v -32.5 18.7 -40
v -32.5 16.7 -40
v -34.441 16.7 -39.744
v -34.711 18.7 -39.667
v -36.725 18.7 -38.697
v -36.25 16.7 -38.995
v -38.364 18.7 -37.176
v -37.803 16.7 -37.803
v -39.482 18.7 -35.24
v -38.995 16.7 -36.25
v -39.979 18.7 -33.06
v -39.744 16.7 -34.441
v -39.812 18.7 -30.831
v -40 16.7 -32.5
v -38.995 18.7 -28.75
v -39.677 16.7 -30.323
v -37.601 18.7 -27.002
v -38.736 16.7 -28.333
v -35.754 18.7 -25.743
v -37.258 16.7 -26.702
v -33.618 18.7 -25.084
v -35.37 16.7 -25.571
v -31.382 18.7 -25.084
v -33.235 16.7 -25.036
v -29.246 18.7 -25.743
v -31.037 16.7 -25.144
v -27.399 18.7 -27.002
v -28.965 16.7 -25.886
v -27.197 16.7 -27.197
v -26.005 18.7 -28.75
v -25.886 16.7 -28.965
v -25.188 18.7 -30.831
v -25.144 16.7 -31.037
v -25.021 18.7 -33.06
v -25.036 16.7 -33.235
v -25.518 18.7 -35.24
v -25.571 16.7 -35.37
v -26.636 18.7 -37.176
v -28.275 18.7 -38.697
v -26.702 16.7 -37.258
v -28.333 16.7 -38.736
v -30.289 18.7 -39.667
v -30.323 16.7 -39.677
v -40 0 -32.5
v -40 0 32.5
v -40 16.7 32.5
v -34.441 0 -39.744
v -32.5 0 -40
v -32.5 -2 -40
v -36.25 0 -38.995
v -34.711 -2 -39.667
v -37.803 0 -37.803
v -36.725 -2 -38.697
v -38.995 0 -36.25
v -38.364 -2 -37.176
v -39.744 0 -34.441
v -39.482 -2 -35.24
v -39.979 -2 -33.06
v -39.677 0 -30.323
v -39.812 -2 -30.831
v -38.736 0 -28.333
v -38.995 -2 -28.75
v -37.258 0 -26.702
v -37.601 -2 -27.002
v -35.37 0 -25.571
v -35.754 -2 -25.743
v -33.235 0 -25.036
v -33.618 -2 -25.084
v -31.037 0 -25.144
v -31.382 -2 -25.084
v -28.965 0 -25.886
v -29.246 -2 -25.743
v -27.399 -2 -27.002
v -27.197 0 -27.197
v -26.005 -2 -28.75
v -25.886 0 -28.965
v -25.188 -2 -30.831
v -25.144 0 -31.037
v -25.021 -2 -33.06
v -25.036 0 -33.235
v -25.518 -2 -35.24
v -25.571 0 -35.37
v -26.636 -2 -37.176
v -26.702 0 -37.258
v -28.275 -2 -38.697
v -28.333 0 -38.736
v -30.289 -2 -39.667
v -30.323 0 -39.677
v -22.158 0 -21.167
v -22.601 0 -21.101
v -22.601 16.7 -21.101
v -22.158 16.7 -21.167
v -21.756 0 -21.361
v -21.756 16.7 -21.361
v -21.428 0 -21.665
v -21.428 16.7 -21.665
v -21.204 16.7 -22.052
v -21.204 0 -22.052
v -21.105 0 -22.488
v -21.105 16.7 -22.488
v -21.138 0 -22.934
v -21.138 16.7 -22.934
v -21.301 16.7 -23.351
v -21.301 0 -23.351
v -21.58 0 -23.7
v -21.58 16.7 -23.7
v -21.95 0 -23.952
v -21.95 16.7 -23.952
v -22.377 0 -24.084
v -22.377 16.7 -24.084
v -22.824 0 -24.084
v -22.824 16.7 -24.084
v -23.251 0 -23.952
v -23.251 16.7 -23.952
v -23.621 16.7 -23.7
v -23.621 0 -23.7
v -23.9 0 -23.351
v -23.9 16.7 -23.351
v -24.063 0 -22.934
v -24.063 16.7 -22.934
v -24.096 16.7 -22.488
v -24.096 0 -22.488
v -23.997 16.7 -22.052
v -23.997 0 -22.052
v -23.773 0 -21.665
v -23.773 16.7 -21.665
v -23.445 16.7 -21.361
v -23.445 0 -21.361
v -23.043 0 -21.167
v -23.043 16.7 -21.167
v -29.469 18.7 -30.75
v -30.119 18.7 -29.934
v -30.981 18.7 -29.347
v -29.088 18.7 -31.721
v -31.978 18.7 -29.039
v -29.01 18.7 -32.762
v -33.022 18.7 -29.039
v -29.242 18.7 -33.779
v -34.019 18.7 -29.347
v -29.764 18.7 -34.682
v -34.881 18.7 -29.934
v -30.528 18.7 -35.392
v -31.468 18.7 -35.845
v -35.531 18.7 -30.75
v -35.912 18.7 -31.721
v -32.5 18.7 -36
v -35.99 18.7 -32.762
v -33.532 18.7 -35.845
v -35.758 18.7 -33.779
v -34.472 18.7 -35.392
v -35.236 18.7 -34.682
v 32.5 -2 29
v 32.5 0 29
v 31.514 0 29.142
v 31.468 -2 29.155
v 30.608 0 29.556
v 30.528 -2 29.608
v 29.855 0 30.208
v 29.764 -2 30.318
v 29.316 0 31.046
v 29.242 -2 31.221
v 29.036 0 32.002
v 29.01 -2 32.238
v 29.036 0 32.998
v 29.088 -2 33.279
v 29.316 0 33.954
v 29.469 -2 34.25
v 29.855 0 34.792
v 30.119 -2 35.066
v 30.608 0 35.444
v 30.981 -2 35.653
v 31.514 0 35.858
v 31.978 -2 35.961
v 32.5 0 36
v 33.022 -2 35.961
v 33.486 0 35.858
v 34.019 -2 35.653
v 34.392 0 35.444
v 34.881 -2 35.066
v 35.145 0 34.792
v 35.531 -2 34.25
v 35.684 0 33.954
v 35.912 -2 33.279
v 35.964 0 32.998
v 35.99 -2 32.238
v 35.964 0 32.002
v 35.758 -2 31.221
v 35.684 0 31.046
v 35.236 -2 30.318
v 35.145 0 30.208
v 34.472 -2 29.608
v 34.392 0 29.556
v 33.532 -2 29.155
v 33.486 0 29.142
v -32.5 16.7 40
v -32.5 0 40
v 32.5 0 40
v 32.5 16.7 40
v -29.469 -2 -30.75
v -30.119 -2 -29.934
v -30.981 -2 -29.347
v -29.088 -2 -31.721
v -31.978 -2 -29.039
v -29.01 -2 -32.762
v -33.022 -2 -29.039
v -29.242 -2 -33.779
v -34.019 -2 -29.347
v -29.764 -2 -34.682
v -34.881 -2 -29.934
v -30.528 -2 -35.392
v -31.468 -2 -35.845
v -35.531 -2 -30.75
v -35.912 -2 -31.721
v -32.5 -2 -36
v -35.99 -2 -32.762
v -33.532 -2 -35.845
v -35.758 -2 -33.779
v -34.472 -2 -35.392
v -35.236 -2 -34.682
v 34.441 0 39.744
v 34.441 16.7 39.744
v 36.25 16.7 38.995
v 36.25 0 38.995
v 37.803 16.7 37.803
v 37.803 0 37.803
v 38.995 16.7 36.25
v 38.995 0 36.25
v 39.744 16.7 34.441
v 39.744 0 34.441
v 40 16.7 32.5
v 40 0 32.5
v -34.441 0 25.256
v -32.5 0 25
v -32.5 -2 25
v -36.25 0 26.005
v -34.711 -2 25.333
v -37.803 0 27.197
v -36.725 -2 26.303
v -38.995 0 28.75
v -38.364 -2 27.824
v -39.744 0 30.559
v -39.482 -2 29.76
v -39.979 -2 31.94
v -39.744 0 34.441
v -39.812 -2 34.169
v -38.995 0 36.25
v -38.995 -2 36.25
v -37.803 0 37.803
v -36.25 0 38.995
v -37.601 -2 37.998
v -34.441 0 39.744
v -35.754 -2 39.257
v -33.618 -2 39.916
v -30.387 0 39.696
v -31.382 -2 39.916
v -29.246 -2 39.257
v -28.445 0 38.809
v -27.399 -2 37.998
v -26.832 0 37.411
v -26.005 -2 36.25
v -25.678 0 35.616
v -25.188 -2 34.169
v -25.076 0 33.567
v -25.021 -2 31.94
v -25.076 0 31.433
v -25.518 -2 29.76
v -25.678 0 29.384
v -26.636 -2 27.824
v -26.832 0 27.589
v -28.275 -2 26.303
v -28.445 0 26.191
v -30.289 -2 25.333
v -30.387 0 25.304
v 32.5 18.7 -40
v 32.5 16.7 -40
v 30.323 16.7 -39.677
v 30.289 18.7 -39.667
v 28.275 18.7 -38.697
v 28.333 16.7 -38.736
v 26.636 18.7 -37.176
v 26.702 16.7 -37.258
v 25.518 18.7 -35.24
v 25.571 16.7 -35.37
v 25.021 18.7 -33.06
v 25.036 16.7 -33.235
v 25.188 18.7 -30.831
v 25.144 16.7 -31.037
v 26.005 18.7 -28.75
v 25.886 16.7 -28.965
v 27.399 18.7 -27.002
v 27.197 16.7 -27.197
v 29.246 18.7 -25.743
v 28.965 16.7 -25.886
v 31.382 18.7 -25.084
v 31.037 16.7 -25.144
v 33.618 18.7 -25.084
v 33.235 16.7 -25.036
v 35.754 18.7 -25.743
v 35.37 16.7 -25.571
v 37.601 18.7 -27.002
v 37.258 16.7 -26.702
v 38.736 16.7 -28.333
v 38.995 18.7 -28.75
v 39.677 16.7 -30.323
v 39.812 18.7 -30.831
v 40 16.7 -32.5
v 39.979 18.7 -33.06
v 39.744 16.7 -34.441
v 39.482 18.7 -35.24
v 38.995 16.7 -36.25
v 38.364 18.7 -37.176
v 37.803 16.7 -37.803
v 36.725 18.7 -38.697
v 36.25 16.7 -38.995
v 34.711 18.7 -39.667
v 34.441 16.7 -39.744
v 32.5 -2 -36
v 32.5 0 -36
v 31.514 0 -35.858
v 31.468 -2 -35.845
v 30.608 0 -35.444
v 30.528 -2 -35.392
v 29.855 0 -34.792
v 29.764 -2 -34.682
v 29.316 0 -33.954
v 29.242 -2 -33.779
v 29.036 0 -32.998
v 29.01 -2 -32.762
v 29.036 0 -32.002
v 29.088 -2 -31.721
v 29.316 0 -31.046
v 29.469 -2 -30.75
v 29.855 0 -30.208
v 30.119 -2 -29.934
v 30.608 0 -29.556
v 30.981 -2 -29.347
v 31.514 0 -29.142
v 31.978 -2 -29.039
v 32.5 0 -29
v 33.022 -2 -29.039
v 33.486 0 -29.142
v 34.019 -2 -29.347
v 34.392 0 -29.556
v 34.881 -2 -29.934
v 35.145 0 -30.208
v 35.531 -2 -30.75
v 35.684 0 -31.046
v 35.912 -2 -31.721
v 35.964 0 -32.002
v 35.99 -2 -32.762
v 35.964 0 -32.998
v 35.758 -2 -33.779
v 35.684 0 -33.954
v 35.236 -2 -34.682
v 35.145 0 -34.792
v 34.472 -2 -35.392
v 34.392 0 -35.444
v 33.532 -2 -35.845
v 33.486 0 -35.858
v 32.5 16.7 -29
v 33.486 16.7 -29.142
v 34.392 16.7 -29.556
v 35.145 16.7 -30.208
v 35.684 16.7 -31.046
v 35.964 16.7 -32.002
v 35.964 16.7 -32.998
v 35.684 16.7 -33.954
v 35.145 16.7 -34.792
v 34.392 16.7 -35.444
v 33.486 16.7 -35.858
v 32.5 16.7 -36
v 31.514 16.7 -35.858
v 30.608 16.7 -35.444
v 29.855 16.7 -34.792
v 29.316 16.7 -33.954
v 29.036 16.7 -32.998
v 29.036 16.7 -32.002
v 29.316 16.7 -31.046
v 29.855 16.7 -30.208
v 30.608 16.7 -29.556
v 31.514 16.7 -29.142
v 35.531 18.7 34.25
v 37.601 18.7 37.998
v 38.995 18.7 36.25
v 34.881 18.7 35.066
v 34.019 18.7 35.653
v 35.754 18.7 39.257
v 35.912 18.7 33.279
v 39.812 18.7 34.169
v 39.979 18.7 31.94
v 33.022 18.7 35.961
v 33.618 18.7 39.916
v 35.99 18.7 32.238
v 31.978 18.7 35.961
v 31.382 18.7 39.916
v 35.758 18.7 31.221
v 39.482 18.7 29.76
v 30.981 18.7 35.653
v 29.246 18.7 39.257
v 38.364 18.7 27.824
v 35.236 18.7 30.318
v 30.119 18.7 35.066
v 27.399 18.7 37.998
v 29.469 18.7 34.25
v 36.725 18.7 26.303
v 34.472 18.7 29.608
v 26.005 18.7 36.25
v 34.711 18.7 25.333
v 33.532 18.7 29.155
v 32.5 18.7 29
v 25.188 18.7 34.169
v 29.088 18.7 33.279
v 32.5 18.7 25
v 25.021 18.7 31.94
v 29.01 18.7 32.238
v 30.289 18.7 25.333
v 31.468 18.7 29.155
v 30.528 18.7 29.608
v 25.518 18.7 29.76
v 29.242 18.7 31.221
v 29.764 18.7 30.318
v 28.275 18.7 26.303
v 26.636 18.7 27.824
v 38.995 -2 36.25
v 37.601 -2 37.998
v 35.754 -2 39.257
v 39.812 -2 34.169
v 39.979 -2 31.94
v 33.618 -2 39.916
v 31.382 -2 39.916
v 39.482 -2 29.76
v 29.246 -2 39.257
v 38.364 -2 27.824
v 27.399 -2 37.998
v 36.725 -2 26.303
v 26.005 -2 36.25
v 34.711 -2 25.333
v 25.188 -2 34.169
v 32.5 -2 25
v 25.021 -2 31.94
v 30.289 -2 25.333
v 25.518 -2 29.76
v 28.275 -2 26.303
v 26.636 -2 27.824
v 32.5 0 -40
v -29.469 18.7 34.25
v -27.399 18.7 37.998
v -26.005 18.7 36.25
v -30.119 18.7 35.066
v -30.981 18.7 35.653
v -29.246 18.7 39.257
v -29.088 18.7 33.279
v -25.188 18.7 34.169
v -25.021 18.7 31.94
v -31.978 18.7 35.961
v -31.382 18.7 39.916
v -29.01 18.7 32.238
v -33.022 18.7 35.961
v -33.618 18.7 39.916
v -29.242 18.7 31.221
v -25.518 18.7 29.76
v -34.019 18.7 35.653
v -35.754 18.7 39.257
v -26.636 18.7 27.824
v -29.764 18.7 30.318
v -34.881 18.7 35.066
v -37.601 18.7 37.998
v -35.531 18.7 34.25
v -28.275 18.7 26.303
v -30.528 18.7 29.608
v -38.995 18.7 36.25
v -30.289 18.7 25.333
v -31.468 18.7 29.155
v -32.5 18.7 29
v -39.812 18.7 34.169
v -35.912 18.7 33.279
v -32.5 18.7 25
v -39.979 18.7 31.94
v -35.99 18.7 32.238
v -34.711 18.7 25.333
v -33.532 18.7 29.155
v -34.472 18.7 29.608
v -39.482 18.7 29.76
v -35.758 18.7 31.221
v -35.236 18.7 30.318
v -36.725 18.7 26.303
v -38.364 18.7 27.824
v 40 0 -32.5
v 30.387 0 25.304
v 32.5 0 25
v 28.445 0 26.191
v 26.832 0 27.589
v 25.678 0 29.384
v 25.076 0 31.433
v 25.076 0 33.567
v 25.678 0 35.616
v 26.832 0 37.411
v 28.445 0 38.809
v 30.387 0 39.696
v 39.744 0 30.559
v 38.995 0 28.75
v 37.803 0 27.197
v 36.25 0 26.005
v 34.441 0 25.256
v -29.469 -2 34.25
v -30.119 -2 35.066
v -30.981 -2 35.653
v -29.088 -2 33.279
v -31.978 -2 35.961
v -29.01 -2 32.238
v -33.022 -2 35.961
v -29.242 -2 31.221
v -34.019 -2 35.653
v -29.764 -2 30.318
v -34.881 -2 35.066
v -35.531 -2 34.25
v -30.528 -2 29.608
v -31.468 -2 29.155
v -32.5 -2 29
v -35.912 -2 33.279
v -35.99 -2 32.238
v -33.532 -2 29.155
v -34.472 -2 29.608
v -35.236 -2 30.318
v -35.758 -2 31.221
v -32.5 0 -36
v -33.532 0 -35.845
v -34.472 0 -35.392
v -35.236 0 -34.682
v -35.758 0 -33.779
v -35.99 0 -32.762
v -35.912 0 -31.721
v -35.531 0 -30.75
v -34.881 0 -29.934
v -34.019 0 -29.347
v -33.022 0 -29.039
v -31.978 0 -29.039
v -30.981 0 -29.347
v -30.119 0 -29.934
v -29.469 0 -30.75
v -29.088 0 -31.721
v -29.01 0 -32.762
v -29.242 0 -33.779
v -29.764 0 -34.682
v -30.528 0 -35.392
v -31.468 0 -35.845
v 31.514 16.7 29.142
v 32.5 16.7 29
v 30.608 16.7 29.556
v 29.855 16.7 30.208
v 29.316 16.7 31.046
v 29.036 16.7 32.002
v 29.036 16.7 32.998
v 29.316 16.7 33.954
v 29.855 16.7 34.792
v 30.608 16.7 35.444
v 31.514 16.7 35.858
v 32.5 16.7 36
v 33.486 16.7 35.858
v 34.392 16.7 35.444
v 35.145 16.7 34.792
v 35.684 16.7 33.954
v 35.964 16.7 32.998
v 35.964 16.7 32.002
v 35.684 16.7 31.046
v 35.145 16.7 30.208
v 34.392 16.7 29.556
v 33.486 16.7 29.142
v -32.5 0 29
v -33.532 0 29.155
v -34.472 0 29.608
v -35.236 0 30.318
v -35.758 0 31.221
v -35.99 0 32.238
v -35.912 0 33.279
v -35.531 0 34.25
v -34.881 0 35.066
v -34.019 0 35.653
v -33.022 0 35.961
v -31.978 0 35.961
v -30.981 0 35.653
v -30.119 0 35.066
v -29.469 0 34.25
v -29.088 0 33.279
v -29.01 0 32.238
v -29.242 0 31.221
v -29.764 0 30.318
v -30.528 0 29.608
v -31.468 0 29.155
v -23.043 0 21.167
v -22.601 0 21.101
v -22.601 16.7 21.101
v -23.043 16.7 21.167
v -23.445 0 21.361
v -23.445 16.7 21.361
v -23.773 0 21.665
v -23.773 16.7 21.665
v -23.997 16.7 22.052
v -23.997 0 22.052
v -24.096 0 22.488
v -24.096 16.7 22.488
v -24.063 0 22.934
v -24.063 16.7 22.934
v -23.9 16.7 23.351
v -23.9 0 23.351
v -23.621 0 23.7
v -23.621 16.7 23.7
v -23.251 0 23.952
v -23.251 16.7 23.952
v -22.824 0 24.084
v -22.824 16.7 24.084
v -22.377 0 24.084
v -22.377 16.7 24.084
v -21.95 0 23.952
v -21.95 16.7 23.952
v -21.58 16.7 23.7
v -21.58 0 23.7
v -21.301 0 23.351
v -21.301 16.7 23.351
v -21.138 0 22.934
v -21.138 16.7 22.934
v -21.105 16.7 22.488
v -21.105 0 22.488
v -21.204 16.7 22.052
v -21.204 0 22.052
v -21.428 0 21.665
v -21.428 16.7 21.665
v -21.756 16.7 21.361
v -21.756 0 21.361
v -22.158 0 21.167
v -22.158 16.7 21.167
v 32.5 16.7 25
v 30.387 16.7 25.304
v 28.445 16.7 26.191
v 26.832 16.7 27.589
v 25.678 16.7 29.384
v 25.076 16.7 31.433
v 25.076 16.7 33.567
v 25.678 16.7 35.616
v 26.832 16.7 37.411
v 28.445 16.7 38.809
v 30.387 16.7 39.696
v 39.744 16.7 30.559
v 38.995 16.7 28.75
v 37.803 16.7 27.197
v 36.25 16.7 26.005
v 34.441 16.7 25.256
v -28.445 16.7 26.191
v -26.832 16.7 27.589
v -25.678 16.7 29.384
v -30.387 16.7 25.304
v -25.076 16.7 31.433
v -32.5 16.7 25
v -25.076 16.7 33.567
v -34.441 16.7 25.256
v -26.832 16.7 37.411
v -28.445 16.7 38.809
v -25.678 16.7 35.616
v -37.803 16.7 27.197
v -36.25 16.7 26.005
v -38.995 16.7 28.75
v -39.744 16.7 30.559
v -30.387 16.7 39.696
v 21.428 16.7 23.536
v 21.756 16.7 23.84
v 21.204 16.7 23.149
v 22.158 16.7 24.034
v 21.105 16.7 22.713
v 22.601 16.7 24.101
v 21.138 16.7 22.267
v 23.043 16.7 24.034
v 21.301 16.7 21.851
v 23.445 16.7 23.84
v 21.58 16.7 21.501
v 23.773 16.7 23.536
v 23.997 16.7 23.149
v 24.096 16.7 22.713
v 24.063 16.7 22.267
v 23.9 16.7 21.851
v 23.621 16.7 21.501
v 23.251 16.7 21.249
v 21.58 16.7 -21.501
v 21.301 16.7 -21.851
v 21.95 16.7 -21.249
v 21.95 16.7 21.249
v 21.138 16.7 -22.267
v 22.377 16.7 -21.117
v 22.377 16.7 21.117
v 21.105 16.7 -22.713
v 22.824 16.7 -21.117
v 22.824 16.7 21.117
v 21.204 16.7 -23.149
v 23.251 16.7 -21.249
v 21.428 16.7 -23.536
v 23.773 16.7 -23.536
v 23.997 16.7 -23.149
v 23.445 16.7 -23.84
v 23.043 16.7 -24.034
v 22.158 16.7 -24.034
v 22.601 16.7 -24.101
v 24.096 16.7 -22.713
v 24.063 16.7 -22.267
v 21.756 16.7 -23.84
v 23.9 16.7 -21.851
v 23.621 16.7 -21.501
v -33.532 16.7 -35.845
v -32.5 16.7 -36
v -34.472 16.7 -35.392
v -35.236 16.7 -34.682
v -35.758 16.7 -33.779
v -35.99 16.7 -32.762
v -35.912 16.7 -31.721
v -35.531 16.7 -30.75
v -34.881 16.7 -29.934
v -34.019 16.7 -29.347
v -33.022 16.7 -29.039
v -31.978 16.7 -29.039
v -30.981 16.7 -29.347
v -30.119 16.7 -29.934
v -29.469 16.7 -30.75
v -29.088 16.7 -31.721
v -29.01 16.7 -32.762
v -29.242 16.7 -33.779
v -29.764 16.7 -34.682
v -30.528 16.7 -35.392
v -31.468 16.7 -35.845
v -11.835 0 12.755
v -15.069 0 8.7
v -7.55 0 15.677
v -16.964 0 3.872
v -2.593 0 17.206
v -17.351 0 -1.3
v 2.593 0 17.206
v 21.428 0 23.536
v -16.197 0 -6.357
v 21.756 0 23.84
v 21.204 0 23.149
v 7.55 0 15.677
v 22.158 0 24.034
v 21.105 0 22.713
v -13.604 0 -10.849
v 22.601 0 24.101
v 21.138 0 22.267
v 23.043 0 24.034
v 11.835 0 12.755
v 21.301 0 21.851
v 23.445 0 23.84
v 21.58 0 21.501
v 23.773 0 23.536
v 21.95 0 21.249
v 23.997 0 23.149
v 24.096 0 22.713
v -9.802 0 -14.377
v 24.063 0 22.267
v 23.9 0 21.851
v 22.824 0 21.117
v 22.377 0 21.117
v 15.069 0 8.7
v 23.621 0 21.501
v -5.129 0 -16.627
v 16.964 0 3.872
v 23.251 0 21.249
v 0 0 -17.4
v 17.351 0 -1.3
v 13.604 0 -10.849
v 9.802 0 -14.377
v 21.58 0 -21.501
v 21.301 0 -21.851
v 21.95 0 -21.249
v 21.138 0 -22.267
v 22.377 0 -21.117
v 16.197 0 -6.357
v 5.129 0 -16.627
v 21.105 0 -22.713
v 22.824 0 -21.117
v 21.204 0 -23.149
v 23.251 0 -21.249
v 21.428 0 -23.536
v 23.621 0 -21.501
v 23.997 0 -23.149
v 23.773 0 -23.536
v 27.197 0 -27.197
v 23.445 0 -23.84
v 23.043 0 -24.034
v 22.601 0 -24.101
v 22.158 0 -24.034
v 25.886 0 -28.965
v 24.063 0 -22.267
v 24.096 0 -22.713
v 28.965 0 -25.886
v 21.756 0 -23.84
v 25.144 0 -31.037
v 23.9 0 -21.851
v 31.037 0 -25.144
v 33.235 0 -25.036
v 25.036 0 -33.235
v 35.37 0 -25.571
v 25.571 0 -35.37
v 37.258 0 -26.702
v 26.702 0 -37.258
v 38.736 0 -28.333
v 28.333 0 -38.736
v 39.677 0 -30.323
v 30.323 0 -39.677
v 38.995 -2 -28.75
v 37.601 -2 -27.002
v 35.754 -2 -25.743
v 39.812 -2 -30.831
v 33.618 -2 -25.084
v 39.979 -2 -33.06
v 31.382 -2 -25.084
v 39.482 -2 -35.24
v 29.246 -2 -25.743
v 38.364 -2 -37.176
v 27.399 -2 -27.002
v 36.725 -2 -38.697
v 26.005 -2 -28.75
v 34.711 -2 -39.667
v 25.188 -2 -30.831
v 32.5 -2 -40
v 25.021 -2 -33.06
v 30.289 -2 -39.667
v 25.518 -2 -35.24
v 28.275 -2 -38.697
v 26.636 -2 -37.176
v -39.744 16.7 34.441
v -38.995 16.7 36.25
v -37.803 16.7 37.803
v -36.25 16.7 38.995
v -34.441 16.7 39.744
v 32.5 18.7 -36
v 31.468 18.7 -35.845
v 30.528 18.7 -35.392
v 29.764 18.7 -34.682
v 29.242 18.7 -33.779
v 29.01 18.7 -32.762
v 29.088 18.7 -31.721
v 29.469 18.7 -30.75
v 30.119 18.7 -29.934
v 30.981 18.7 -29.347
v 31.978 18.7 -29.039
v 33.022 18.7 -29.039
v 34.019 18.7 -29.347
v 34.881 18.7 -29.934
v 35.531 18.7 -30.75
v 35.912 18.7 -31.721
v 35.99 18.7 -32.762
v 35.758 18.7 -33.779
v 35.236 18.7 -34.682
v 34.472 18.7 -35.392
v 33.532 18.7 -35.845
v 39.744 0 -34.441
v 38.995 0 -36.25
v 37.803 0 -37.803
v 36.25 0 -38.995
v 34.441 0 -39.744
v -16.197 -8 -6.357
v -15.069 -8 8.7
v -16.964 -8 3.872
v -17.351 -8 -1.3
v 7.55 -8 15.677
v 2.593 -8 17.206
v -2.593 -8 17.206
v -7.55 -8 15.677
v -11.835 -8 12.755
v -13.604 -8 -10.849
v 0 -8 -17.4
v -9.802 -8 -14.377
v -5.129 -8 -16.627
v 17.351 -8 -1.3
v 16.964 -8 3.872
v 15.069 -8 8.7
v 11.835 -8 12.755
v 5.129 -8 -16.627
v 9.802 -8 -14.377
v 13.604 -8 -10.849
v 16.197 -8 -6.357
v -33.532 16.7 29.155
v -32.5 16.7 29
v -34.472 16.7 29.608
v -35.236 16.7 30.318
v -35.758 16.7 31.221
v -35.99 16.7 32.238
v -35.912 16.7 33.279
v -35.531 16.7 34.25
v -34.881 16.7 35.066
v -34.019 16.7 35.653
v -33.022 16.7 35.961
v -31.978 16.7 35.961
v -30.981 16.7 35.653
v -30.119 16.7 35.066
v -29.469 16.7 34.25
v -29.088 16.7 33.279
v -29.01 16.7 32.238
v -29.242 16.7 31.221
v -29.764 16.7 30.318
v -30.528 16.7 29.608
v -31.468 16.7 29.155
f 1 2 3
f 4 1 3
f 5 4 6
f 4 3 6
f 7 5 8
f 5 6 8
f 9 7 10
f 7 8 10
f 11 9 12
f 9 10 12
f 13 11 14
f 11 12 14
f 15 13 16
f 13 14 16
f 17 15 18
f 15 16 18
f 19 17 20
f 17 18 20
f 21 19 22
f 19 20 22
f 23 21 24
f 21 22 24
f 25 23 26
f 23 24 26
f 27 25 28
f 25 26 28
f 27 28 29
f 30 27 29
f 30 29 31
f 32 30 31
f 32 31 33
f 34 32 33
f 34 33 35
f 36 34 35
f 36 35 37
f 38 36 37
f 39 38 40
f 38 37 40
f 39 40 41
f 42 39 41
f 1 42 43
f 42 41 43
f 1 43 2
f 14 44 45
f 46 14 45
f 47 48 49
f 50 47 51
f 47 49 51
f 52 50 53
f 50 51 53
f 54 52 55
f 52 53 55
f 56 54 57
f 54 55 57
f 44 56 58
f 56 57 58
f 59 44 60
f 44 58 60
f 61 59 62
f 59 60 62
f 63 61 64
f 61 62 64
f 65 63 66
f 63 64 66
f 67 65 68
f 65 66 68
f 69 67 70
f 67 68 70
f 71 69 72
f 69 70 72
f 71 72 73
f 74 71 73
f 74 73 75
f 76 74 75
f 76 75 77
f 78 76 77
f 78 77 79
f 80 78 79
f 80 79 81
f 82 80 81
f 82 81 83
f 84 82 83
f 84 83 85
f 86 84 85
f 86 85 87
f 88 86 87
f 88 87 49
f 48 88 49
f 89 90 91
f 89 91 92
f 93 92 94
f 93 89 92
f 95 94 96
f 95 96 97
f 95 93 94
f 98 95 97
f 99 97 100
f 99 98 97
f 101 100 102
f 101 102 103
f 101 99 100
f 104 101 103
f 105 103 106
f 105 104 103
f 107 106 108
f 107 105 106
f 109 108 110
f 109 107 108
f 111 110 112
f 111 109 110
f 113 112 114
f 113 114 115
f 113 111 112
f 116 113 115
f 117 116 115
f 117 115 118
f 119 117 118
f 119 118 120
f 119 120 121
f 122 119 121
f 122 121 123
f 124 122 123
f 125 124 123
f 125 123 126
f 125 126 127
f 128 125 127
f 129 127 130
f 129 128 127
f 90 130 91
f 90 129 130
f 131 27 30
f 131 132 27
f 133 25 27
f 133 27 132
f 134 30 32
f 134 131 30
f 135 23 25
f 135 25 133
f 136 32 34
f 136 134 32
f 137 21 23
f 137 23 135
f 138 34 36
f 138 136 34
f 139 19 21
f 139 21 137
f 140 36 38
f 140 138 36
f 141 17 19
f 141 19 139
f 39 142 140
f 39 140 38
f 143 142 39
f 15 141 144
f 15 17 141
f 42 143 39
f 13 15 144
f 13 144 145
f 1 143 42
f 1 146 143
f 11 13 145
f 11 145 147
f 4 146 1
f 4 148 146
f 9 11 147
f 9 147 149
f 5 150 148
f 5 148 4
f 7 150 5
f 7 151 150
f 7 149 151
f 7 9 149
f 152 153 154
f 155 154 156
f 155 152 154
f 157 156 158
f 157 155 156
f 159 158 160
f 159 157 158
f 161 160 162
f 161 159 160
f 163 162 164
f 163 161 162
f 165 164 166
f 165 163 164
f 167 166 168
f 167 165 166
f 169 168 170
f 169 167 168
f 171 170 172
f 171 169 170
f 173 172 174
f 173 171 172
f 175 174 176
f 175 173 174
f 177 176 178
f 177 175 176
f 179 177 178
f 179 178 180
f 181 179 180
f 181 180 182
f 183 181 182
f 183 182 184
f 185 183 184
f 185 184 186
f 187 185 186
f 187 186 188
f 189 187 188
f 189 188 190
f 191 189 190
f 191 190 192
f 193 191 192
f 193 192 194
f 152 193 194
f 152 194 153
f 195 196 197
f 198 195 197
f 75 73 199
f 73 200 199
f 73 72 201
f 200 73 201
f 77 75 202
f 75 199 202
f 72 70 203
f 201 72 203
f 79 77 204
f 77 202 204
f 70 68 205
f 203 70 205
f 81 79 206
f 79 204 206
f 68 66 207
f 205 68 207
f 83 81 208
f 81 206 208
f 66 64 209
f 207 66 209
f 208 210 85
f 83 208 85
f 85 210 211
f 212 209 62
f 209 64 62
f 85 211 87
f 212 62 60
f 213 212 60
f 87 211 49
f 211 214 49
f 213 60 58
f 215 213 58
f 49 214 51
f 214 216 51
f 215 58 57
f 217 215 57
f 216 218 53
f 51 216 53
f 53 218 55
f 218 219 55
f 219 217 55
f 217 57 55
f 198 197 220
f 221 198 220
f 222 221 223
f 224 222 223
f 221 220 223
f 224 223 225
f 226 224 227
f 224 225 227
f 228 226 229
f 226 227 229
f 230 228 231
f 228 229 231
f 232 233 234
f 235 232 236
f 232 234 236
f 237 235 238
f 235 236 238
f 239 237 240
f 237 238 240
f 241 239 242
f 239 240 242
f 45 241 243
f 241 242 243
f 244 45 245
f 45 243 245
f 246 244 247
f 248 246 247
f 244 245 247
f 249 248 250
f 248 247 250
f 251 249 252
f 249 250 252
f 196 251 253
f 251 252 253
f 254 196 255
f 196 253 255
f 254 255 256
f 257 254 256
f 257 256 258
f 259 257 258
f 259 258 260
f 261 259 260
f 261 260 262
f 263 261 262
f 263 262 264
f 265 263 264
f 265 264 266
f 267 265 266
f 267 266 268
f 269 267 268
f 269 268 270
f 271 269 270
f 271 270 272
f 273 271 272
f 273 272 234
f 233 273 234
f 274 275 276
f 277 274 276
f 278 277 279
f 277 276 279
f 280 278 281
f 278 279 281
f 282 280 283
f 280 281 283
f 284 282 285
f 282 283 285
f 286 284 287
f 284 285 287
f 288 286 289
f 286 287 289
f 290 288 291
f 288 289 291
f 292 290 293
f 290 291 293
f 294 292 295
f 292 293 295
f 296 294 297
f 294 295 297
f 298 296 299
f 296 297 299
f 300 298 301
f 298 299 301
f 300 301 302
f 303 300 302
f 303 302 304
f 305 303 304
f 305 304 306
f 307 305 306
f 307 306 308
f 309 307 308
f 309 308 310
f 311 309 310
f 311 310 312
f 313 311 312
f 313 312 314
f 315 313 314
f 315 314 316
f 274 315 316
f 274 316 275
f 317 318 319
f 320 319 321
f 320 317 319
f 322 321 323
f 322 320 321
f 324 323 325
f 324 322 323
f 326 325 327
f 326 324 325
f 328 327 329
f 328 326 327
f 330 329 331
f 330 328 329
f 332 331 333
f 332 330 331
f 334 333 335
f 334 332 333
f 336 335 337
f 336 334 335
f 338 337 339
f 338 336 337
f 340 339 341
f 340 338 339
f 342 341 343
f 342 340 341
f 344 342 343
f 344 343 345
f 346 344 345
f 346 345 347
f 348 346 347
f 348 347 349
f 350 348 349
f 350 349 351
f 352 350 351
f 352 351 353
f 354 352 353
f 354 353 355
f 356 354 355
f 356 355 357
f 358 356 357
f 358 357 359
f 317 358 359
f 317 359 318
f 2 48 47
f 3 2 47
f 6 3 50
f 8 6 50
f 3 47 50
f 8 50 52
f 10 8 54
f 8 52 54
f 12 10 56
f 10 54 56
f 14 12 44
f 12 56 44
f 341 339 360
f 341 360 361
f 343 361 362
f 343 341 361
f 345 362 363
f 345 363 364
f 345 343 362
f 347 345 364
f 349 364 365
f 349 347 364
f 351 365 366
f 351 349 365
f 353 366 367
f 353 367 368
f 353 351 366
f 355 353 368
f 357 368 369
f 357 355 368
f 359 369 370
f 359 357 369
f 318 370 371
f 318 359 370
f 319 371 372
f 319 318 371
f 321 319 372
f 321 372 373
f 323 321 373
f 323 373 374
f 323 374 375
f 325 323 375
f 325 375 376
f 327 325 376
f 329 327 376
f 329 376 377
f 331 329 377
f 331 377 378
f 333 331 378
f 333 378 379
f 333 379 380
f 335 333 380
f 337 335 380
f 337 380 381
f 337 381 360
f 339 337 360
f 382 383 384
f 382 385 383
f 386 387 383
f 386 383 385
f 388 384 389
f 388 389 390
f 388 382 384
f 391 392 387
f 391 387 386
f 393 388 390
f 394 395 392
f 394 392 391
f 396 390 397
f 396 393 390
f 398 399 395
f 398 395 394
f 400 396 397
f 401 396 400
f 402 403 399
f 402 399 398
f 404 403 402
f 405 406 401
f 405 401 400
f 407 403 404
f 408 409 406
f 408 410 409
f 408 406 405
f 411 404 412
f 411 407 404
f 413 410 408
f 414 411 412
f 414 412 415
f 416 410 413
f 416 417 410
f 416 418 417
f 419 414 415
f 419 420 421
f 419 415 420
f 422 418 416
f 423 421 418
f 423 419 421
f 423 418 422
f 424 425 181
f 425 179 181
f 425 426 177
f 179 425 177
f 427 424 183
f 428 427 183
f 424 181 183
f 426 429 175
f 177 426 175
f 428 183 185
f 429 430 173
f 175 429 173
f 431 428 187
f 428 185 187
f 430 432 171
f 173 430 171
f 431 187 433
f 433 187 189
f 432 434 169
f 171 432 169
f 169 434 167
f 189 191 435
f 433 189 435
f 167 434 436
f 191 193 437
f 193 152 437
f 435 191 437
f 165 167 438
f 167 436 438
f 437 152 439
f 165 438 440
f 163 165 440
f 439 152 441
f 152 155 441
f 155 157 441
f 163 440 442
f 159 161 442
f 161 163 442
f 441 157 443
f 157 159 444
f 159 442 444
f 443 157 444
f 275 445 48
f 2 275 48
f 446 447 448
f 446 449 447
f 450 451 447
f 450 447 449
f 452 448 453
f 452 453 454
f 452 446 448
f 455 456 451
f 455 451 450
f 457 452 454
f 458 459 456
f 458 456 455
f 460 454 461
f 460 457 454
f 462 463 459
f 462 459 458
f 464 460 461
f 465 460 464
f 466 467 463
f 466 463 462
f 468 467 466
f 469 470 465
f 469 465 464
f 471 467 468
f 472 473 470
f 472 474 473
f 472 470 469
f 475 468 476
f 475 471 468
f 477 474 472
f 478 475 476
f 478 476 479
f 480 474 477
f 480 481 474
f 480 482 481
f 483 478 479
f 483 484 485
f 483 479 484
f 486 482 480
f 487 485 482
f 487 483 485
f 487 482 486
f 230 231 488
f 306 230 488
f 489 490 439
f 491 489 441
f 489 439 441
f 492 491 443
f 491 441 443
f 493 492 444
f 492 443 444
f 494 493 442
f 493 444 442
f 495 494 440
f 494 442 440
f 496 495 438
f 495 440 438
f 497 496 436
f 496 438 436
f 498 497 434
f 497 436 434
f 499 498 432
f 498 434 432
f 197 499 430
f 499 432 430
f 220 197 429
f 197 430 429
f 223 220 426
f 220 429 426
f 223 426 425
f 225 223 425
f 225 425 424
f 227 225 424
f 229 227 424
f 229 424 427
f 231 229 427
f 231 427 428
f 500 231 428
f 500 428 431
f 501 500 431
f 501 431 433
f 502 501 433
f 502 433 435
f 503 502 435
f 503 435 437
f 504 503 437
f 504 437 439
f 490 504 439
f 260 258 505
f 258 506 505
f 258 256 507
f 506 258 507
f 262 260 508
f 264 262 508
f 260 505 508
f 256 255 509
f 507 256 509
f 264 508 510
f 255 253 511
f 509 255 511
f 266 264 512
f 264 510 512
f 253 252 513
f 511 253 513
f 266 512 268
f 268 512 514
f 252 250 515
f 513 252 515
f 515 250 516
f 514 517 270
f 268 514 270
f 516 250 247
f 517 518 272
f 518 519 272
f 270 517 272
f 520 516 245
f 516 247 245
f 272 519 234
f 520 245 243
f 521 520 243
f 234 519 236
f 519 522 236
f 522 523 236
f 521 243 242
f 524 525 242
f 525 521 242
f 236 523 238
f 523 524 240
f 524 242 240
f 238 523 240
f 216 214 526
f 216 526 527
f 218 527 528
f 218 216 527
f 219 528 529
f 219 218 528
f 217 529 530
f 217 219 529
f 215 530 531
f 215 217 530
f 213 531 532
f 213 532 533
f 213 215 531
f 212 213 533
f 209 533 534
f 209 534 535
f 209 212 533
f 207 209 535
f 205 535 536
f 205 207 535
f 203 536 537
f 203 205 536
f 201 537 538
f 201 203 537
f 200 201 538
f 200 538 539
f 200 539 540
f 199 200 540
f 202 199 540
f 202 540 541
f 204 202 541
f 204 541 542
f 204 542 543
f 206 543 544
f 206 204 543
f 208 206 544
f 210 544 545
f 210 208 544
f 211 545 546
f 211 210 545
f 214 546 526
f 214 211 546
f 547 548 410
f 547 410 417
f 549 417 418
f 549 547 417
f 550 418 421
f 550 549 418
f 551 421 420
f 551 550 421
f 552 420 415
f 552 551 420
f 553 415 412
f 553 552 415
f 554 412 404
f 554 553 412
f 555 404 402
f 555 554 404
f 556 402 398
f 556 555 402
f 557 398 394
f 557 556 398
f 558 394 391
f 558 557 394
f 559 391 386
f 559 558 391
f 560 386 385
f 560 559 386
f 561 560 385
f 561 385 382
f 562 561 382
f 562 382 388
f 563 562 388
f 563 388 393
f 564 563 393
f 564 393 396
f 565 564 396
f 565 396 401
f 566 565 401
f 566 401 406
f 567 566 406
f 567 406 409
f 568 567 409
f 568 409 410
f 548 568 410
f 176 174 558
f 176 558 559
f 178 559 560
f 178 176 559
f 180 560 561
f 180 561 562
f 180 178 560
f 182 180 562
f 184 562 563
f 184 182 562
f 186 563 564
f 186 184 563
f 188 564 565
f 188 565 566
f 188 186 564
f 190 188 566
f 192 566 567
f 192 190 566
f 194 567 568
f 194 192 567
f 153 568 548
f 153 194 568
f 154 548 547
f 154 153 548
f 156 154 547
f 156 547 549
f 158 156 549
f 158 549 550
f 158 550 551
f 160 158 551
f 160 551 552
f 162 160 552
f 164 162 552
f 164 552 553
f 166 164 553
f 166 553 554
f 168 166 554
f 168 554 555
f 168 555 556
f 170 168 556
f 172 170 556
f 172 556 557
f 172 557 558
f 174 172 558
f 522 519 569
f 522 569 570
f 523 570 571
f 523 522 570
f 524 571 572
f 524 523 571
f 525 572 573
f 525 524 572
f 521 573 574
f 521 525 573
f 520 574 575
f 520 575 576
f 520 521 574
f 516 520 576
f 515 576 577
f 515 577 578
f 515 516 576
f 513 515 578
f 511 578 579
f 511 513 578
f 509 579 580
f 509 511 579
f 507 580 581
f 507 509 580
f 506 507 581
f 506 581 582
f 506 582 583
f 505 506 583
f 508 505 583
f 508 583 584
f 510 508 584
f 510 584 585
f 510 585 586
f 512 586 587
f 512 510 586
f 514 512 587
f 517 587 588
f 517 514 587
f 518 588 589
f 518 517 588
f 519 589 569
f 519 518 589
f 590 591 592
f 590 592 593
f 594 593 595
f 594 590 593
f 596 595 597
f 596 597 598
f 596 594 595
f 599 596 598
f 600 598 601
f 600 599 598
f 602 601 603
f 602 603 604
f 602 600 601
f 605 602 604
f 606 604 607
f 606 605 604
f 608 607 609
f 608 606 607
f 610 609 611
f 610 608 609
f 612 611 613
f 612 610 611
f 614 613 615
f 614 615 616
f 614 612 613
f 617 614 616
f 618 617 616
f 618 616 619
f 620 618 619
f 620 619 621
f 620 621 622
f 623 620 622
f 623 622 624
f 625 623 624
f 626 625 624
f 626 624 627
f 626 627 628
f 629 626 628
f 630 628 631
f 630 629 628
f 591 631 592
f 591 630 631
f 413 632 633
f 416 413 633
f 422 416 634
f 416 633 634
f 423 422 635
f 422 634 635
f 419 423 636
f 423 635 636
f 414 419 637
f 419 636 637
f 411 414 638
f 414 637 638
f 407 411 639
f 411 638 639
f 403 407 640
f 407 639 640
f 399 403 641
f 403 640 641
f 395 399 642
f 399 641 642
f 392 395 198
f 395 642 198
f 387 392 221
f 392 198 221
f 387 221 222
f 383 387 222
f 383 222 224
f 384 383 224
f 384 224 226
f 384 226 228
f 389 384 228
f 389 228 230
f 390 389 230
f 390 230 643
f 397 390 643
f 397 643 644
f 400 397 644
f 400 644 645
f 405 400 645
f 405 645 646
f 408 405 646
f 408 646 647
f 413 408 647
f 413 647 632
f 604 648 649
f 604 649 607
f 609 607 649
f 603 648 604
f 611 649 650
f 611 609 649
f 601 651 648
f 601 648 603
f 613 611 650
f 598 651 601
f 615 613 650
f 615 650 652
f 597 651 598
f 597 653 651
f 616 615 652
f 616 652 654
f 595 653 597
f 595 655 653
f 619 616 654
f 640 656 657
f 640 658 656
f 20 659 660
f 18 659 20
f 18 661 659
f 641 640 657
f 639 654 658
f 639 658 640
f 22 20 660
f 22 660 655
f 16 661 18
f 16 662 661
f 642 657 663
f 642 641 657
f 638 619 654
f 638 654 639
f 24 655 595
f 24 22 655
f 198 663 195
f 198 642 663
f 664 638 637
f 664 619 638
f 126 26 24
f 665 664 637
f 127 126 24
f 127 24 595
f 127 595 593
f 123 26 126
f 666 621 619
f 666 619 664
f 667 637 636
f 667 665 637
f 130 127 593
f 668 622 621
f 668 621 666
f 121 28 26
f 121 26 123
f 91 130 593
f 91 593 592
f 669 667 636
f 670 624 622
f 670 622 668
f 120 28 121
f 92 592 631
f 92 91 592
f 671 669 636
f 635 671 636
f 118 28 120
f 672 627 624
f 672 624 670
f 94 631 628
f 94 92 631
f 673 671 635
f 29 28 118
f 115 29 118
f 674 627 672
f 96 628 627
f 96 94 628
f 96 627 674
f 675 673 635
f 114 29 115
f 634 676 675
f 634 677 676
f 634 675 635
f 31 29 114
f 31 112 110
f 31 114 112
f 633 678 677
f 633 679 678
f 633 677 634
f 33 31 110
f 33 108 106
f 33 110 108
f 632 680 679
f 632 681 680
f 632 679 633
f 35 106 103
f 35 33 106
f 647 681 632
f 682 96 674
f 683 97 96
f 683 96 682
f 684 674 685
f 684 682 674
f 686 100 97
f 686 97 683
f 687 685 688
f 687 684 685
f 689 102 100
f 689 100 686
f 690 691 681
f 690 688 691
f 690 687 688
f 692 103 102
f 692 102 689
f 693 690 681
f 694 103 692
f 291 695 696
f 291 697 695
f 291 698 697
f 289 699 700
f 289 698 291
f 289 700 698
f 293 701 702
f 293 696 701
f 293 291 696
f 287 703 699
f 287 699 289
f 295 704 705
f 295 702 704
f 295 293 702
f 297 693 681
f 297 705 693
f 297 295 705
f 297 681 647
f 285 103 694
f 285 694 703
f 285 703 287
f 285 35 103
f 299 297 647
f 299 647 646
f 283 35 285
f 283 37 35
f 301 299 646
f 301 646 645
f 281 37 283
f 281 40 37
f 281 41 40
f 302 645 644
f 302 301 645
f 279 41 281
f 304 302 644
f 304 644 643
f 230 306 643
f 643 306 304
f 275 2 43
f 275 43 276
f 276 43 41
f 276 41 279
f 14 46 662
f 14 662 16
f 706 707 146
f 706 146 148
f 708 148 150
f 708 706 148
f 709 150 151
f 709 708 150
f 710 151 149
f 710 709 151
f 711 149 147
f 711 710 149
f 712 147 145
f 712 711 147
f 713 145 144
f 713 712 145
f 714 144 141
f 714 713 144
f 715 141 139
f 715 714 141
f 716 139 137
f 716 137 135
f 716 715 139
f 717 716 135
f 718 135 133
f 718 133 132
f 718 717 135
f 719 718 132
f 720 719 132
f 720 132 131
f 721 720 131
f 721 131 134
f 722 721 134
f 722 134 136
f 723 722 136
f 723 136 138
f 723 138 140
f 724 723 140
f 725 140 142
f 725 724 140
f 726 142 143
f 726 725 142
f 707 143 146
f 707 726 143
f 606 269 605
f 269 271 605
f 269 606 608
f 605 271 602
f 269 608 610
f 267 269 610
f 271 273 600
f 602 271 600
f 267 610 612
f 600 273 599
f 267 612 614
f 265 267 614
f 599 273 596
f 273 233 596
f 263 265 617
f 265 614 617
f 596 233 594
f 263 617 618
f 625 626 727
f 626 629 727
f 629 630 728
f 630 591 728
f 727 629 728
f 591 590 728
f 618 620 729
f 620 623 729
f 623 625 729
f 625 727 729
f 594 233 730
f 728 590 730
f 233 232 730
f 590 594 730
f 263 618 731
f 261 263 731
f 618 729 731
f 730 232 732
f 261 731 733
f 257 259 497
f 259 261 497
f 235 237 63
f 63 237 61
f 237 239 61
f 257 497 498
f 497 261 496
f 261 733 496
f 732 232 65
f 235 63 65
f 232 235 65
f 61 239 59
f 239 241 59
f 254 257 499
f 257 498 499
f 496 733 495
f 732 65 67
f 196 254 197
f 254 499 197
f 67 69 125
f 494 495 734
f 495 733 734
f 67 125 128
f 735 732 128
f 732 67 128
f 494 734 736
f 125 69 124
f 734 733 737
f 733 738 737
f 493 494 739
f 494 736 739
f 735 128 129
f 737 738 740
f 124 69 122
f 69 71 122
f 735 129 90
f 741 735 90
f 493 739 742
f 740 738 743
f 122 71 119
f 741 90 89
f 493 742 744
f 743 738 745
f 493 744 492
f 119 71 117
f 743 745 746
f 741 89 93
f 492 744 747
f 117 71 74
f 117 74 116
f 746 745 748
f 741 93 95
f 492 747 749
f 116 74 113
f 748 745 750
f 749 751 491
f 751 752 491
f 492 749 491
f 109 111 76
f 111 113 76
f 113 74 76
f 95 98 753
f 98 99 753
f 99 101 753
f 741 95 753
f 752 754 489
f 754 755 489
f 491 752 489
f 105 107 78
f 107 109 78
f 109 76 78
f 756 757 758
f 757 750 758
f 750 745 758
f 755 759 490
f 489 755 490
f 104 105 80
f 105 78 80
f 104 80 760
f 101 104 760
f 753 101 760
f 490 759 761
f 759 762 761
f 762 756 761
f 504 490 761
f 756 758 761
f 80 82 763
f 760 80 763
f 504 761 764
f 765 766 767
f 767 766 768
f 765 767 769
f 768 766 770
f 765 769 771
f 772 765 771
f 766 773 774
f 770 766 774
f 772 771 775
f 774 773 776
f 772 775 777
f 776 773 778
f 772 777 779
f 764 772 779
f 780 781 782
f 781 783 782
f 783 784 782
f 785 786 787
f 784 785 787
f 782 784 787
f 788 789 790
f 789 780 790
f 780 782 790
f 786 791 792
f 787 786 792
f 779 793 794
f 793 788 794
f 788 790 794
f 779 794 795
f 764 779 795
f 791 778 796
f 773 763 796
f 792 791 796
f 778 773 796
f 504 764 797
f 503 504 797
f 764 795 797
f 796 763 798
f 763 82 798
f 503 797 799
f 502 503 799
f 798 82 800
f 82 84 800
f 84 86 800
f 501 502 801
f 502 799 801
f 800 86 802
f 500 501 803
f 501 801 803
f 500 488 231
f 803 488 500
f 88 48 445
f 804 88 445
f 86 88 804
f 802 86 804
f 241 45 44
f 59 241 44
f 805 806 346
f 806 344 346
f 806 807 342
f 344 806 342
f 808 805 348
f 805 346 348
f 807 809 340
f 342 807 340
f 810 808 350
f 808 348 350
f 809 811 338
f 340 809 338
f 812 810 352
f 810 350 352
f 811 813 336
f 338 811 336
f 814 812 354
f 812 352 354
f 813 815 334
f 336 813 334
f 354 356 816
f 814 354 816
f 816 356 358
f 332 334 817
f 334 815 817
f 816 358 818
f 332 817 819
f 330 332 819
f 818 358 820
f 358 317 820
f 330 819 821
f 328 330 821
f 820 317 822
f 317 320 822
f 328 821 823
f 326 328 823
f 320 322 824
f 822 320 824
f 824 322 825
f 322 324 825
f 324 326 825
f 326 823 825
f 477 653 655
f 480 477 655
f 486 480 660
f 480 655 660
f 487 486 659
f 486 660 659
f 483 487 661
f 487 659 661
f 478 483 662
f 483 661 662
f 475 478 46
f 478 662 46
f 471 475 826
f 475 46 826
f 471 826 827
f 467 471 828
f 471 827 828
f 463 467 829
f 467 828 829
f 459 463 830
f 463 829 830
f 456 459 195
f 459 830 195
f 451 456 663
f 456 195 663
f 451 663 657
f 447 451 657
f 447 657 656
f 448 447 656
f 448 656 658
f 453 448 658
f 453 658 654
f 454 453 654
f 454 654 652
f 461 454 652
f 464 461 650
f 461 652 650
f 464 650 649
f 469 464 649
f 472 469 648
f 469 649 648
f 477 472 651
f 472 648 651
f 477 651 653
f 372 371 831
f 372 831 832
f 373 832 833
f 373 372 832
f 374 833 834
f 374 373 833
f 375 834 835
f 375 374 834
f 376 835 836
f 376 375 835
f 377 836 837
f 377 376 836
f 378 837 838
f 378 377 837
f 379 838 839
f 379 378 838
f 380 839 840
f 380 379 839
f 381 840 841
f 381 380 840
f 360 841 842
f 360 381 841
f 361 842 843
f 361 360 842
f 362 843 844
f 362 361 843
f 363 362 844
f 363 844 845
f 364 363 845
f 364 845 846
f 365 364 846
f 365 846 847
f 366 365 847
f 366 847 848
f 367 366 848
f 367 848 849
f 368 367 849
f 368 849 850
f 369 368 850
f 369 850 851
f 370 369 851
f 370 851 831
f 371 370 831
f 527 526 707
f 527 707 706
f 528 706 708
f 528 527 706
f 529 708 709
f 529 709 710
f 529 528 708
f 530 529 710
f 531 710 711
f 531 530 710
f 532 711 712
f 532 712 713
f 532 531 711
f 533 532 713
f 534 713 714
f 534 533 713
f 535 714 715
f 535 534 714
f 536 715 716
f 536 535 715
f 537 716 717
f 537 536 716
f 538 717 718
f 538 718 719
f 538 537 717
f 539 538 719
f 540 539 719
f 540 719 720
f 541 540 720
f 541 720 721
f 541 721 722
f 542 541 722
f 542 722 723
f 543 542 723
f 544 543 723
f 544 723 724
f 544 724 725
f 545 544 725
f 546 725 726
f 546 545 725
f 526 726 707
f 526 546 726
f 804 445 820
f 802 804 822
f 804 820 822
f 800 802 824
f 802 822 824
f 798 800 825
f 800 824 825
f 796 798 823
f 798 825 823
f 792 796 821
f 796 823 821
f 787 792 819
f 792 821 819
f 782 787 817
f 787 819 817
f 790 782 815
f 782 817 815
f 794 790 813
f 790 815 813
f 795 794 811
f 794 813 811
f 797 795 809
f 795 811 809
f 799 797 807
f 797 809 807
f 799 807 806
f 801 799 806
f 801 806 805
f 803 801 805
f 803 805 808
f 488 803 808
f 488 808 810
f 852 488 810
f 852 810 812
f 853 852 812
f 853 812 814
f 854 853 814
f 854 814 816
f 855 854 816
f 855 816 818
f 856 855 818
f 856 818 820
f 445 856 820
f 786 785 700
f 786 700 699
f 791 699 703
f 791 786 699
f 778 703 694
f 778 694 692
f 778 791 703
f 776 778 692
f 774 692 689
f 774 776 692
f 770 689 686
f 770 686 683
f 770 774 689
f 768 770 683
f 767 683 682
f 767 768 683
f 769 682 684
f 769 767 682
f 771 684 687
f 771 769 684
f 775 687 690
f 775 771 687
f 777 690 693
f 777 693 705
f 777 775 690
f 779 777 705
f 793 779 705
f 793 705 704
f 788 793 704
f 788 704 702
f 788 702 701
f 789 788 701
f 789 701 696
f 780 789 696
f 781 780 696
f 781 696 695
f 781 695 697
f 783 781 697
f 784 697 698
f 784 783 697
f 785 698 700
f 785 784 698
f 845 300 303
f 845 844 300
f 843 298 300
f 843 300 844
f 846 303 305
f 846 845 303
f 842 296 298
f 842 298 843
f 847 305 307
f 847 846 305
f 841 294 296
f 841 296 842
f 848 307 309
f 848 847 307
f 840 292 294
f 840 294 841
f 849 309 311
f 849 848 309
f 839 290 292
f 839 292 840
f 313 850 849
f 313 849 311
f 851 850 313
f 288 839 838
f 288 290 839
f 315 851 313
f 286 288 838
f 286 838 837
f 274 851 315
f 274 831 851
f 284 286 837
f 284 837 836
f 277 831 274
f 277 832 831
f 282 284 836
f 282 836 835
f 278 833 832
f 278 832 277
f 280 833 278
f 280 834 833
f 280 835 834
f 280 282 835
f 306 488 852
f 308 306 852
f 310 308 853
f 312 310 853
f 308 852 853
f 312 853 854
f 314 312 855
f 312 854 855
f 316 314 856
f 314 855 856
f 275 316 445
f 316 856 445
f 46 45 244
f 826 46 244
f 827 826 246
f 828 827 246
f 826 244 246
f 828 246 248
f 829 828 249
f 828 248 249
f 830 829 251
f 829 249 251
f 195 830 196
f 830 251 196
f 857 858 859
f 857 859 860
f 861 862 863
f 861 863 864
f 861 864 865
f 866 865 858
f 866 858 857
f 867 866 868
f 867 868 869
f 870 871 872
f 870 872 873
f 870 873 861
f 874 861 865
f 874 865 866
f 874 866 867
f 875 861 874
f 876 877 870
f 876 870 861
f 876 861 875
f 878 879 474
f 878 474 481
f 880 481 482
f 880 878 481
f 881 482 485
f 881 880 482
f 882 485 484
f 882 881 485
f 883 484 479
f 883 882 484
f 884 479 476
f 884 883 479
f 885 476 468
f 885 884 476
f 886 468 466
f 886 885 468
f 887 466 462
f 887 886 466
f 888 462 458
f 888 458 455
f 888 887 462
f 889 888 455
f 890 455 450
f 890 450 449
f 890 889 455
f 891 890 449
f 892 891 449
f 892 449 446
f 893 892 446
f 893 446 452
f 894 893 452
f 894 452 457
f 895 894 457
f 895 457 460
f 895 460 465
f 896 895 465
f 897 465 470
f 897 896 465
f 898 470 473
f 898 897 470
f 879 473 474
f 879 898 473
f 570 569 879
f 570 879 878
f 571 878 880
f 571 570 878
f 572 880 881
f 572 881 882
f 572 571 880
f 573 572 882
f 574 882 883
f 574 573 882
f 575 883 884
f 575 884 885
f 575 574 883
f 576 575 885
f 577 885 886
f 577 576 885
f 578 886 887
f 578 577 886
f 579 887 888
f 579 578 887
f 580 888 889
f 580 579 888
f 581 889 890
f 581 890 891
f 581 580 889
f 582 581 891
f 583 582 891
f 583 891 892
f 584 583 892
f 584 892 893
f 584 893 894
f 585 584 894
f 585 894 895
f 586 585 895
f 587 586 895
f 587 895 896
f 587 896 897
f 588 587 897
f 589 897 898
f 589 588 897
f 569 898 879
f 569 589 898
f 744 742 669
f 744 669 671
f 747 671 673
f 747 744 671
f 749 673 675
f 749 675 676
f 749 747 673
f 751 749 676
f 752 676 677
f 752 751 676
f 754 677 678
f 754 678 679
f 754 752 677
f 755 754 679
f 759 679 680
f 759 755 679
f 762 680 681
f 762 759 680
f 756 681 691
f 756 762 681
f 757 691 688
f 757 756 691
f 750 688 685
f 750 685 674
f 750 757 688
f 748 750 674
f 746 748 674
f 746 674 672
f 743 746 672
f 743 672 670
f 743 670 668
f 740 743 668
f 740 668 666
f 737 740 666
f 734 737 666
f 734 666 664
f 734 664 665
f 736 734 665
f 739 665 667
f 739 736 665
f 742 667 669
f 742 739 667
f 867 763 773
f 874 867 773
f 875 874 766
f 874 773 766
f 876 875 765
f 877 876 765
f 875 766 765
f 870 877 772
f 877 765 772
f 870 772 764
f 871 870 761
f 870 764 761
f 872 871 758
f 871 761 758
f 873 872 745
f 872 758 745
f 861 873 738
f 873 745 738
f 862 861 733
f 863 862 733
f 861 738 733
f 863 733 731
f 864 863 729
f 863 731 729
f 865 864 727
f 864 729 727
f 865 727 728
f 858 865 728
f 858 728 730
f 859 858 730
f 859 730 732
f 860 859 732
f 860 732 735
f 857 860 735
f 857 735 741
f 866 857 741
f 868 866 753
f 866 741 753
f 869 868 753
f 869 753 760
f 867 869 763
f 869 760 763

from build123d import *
from build123d.topology import SkipClean

# Parameters (mm, degrees)
SKETCH1_R           = 3.5
SKETCH1_R_2         = 1.5
BOSS_EXTRUDE1_DEPTH = 16.7
SKETCH4_R           = 7.5
SKETCH4_R_2         = 3.5
BOSS_EXTRUDE5_DEPTH = 2
SKETCH5_R           = 17.4
BOSS_EXTRUDE7_DEPTH = 8
BOSS_EXTRUDE8_START = -18.7
SKETCH4_2_R         = 7.5
SKETCH4_2_R_2       = 3.5
BOSS_EXTRUDE8_DEPTH = 2


with BuildPart() as part:
    # Sketch1 → Boss-Extrude1 (new body)
    with BuildSketch(Plane(origin=(0, 0, 0), x_dir=(1, 0, 0), z_dir=(0, 1, 0))):
        with BuildLine():
            Line((-32.5, -40), (32.5, -40))
            ThreePointArc((32.5, -40), (37.803300859, -37.803300859), (40, -32.5))
            Line((40, -32.5), (40, 32.5))
            ThreePointArc((40, 32.5), (37.803300859, 37.803300859), (32.5, 40))
            Line((32.5, 40), (-32.5, 40))
            ThreePointArc((-32.5, 40), (-37.803300859, 37.803300859), (-40, 32.5))
            Line((-40, 32.5), (-40, -32.5))
            ThreePointArc((-40, -32.5), (-37.803300859, -37.803300859), (-32.5, -40))
        make_face()
        with Locations(Location((32.5, 32.5, 0), (0, 0, 270))):
            Circle(SKETCH1_R, mode=Mode.SUBTRACT)
        with Locations(Location((-32.5, -32.5, 0), (0, 0, 90))):
            Circle(SKETCH1_R, mode=Mode.SUBTRACT)
        with Locations(Location((-32.5, 32.5, 0), (0, 0, 90))):
            Circle(SKETCH1_R, mode=Mode.SUBTRACT)
        with Locations(Location((32.5, -32.5, 0), (0, 0, 270))):
            Circle(SKETCH1_R, mode=Mode.SUBTRACT)
        with Locations(Location((22.600505063, -22.600505063, 0), (0, 0, 270))):
            Circle(SKETCH1_R_2, mode=Mode.SUBTRACT)
        with Locations(Location((-22.600505063, -22.600505063, 0), (0, 0, 90))):
            Circle(SKETCH1_R_2, mode=Mode.SUBTRACT)
        with Locations(Location((-22.600505063, 22.600505063, 0), (0, 0, 270))):
            Circle(SKETCH1_R_2, mode=Mode.SUBTRACT)
        with Locations(Location((22.600505063, 22.600505063, 0), (0, 0, 90))):
            Circle(SKETCH1_R_2, mode=Mode.SUBTRACT)
    extrude(amount=BOSS_EXTRUDE1_DEPTH)

    # Sketch4 → Boss-Extrude5 (add)
    # profile 1 of 4: a face of its own
    with BuildSketch(Plane(origin=(0, 16.7, 0), x_dir=(1, 0, 0), z_dir=(0, 1, 0))):
        with Locations(Location((32.5, 32.5, 0), (0, 0, 90))):
            Circle(SKETCH4_R)
        with Locations(Location((32.5, 32.5, 0), (0, 0, 90))):
            Circle(SKETCH4_R_2, mode=Mode.SUBTRACT)
    # profile 2 of 4: a face of its own
    with BuildSketch(Plane(origin=(0, 16.7, 0), x_dir=(1, 0, 0), z_dir=(0, 1, 0))):
        with Locations(Location((32.5, -32.5, 0), (0, 0, 90))):
            Circle(SKETCH4_R)
        with Locations(Location((32.5, -32.5, 0), (0, 0, 90))):
            Circle(SKETCH4_R_2, mode=Mode.SUBTRACT)
    # profile 3 of 4: a face of its own
    with BuildSketch(Plane(origin=(0, 16.7, 0), x_dir=(1, 0, 0), z_dir=(0, 1, 0))):
        with Locations(Location((-32.5, -32.5, 0), (0, 0, 90))):
            Circle(SKETCH4_R)
        with Locations(Location((-32.5, -32.5, 0), (0, 0, 90))):
            Circle(SKETCH4_R_2, mode=Mode.SUBTRACT)
    # profile 4 of 4: a face of its own
    with BuildSketch(Plane(origin=(0, 16.7, 0), x_dir=(1, 0, 0), z_dir=(0, 1, 0))):
        with Locations(Location((-32.5, 32.5, 0), (0, 0, 90))):
            Circle(SKETCH4_R)
        with Locations(Location((-32.5, 32.5, 0), (0, 0, 90))):
            Circle(SKETCH4_R_2, mode=Mode.SUBTRACT)
    extrude(amount=BOSS_EXTRUDE5_DEPTH)

    # Sketch5 → Boss-Extrude7 (add)
    with BuildSketch(Plane.XZ):
        with Locations(Location((0, 0, 0), (0, 0, 270))):
            Circle(SKETCH5_R)
    extrude(amount=BOSS_EXTRUDE7_DEPTH)

    # Sketch4<2> → Boss-Extrude8 (add)
    # profile 1 of 4: a face of its own
    with SkipClean():  # the faces are left unmerged after this step: merging them gives an invalid solid
        with BuildSketch(Plane(origin=(0, 16.7, 0), x_dir=(1, 0, 0), z_dir=(0, 1, 0)).offset(BOSS_EXTRUDE8_START)):
            with Locations(Location((32.5, 32.5, 0), (0, 0, 90))):
                Circle(SKETCH4_2_R)
            with Locations(Location((32.5, 32.5, 0), (0, 0, 90))):
                Circle(SKETCH4_2_R_2, mode=Mode.SUBTRACT)
        # profile 2 of 4: a face of its own
        with BuildSketch(Plane(origin=(0, 16.7, 0), x_dir=(1, 0, 0), z_dir=(0, 1, 0)).offset(BOSS_EXTRUDE8_START)):
            with Locations(Location((32.5, -32.5, 0), (0, 0, 90))):
                Circle(SKETCH4_2_R)
            with Locations(Location((32.5, -32.5, 0), (0, 0, 90))):
                Circle(SKETCH4_2_R_2, mode=Mode.SUBTRACT)
        # profile 3 of 4: a face of its own
        with BuildSketch(Plane(origin=(0, 16.7, 0), x_dir=(1, 0, 0), z_dir=(0, 1, 0)).offset(BOSS_EXTRUDE8_START)):
            with Locations(Location((-32.5, -32.5, 0), (0, 0, 90))):
                Circle(SKETCH4_2_R)
            with Locations(Location((-32.5, -32.5, 0), (0, 0, 90))):
                Circle(SKETCH4_2_R_2, mode=Mode.SUBTRACT)
        # profile 4 of 4: a face of its own
        with BuildSketch(Plane(origin=(0, 16.7, 0), x_dir=(1, 0, 0), z_dir=(0, 1, 0)).offset(BOSS_EXTRUDE8_START)):
            with Locations(Location((-32.5, 32.5, 0), (0, 0, 90))):
                Circle(SKETCH4_2_R)
            with Locations(Location((-32.5, 32.5, 0), (0, 0, 90))):
                Circle(SKETCH4_2_R_2, mode=Mode.SUBTRACT)
        extrude(amount=BOSS_EXTRUDE8_DEPTH)


solid = part.part
